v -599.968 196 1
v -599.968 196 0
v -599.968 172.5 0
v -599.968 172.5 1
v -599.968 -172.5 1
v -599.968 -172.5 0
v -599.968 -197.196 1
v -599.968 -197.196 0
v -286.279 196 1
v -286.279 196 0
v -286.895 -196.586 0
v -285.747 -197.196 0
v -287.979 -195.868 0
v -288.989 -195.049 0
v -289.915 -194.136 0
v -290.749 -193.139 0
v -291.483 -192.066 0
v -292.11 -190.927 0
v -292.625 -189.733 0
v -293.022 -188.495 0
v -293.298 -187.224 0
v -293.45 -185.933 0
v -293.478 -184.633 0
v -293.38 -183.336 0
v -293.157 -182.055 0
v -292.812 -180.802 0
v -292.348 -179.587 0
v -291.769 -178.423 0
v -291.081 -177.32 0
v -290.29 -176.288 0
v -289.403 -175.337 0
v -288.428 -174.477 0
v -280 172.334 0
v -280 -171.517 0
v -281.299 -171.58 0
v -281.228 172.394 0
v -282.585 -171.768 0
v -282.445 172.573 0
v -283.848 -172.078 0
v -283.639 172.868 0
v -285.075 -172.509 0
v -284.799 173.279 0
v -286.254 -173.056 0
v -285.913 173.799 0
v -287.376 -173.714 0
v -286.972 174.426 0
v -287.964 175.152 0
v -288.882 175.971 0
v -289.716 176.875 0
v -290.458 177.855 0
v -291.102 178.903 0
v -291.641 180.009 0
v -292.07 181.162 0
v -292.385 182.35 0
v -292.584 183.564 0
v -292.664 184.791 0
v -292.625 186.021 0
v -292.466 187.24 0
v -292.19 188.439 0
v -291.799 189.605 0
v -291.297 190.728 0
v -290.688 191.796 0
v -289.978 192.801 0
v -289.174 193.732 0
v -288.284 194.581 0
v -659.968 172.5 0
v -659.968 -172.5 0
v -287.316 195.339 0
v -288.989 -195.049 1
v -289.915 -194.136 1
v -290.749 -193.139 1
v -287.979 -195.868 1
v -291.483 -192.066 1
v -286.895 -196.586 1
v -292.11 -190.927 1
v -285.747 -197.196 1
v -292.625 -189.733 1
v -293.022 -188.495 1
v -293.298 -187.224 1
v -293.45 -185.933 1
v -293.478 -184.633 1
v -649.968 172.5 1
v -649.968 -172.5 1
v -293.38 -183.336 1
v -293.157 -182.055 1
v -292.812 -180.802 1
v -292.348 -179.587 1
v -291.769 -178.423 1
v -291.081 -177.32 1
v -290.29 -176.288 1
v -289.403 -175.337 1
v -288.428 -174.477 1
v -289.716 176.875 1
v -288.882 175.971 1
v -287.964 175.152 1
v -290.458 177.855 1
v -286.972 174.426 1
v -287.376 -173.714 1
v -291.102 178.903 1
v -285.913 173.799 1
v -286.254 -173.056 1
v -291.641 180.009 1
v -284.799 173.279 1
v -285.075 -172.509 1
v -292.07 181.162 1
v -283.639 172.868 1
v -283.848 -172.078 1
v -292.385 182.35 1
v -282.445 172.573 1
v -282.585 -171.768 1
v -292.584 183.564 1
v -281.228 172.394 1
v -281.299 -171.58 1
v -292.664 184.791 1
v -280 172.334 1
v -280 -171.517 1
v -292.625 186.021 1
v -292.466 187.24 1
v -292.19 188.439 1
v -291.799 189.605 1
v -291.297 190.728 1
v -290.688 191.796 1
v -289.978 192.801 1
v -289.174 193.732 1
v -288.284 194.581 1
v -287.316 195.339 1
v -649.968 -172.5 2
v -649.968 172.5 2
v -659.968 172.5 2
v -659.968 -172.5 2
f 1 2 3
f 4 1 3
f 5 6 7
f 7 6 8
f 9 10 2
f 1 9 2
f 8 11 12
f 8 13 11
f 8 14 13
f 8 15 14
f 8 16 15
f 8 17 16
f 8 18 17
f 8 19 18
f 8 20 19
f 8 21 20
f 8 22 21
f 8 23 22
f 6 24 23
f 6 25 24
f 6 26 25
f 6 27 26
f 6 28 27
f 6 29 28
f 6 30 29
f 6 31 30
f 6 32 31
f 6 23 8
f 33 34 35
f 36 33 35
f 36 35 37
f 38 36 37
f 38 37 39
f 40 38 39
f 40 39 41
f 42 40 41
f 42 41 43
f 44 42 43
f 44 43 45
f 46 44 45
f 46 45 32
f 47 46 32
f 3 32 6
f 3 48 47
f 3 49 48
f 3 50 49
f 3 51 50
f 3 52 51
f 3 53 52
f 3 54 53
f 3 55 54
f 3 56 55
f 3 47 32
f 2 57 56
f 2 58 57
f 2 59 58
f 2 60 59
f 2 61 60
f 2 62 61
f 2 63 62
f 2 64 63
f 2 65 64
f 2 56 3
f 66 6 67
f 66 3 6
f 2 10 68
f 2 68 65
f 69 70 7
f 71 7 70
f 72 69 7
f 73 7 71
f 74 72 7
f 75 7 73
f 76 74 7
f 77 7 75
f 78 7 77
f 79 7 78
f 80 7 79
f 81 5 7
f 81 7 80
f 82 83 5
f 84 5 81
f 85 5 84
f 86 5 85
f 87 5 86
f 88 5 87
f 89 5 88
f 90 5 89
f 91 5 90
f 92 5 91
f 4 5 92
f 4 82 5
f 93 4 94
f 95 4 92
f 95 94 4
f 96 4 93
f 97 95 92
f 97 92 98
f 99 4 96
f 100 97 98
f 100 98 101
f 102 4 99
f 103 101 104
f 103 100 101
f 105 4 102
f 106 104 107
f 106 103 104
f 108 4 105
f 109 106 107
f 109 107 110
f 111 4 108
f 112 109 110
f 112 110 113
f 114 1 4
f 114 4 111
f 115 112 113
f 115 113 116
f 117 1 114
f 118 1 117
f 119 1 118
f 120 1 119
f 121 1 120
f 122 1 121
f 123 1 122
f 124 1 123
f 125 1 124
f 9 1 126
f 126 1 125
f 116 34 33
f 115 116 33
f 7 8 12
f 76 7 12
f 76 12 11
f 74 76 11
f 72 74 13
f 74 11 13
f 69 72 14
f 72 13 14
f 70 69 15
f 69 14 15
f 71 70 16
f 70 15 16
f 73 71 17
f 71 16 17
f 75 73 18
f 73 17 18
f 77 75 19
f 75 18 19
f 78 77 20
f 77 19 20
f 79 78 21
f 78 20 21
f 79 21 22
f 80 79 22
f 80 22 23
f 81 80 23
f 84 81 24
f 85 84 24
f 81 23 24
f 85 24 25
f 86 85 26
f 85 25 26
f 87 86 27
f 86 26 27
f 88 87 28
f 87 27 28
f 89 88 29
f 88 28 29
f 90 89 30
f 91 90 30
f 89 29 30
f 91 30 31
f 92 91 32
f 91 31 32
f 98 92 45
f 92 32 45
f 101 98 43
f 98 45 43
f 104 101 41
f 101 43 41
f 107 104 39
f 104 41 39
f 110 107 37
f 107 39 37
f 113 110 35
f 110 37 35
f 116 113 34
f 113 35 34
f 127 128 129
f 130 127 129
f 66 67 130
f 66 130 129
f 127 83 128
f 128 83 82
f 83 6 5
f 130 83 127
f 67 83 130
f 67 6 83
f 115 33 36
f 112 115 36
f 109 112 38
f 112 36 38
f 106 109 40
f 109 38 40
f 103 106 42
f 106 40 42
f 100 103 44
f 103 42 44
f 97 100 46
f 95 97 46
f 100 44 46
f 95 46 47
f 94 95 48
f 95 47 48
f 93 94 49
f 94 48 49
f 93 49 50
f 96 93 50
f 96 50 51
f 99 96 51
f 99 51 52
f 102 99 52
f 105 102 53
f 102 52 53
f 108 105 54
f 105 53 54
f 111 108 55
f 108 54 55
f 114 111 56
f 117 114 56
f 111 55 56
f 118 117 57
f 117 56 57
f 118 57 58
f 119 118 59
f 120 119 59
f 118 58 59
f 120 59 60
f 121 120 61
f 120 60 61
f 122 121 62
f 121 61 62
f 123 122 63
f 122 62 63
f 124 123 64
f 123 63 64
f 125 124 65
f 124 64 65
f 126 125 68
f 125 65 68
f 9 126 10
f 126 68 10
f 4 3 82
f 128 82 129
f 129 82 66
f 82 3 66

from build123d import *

# Parameters (mm, degrees)
DODANIE_WYCI_GNI_CIE1_DEPTH = 1
SZKIC2_W                    = 10
SZKIC2_H                    = 345
DODANIE_WYCI_GNI_CIE2_DEPTH = 2


with BuildPart() as part:
    # Szkic1 → Dodanie-wyciągnięcie1 (new body)
    with BuildSketch(Plane.XY):
        with BuildLine():
            Line((-286.27862804, 196), (-599.968042624, 196))
            Line((-599.968042624, 196), (-599.968042624, 172.5))
            Line((-599.968042624, 172.5), (-649.968042624, 172.5))
            Line((-649.968042624, 172.5), (-649.968042624, -172.5))
            Line((-649.968042624, -172.5), (-599.968042624, -172.5))
            Line((-599.968042624, -172.5), (-599.968042624, -197.196347915))
            Line((-599.968042624, -197.196347915), (-285.747034082, -197.196347915))
            ThreePointArc((-285.747034082, -197.196347915), (-293.157074923, -182.055397704), (-280, -171.517444485))
            Line((-280, -171.517444485), (-280, 172.334252092))
            ThreePointArc((-280, 172.334252092), (-292.242230129, 181.752081969), (-286.27862804, 196))
        make_face()
    extrude(amount=DODANIE_WYCI_GNI_CIE1_DEPTH)

    # Szkic2 → Dodanie-wyciągnięcie2 (add)
    with BuildSketch(Plane(origin=(0, 0, 0), x_dir=(-1, 0, 0), z_dir=(0, 0, -1))):
        with Locations((654.968042624, 0)):
            Rectangle(SZKIC2_W, SZKIC2_H)
    extrude(amount=-DODANIE_WYCI_GNI_CIE2_DEPTH)


solid = part.part
